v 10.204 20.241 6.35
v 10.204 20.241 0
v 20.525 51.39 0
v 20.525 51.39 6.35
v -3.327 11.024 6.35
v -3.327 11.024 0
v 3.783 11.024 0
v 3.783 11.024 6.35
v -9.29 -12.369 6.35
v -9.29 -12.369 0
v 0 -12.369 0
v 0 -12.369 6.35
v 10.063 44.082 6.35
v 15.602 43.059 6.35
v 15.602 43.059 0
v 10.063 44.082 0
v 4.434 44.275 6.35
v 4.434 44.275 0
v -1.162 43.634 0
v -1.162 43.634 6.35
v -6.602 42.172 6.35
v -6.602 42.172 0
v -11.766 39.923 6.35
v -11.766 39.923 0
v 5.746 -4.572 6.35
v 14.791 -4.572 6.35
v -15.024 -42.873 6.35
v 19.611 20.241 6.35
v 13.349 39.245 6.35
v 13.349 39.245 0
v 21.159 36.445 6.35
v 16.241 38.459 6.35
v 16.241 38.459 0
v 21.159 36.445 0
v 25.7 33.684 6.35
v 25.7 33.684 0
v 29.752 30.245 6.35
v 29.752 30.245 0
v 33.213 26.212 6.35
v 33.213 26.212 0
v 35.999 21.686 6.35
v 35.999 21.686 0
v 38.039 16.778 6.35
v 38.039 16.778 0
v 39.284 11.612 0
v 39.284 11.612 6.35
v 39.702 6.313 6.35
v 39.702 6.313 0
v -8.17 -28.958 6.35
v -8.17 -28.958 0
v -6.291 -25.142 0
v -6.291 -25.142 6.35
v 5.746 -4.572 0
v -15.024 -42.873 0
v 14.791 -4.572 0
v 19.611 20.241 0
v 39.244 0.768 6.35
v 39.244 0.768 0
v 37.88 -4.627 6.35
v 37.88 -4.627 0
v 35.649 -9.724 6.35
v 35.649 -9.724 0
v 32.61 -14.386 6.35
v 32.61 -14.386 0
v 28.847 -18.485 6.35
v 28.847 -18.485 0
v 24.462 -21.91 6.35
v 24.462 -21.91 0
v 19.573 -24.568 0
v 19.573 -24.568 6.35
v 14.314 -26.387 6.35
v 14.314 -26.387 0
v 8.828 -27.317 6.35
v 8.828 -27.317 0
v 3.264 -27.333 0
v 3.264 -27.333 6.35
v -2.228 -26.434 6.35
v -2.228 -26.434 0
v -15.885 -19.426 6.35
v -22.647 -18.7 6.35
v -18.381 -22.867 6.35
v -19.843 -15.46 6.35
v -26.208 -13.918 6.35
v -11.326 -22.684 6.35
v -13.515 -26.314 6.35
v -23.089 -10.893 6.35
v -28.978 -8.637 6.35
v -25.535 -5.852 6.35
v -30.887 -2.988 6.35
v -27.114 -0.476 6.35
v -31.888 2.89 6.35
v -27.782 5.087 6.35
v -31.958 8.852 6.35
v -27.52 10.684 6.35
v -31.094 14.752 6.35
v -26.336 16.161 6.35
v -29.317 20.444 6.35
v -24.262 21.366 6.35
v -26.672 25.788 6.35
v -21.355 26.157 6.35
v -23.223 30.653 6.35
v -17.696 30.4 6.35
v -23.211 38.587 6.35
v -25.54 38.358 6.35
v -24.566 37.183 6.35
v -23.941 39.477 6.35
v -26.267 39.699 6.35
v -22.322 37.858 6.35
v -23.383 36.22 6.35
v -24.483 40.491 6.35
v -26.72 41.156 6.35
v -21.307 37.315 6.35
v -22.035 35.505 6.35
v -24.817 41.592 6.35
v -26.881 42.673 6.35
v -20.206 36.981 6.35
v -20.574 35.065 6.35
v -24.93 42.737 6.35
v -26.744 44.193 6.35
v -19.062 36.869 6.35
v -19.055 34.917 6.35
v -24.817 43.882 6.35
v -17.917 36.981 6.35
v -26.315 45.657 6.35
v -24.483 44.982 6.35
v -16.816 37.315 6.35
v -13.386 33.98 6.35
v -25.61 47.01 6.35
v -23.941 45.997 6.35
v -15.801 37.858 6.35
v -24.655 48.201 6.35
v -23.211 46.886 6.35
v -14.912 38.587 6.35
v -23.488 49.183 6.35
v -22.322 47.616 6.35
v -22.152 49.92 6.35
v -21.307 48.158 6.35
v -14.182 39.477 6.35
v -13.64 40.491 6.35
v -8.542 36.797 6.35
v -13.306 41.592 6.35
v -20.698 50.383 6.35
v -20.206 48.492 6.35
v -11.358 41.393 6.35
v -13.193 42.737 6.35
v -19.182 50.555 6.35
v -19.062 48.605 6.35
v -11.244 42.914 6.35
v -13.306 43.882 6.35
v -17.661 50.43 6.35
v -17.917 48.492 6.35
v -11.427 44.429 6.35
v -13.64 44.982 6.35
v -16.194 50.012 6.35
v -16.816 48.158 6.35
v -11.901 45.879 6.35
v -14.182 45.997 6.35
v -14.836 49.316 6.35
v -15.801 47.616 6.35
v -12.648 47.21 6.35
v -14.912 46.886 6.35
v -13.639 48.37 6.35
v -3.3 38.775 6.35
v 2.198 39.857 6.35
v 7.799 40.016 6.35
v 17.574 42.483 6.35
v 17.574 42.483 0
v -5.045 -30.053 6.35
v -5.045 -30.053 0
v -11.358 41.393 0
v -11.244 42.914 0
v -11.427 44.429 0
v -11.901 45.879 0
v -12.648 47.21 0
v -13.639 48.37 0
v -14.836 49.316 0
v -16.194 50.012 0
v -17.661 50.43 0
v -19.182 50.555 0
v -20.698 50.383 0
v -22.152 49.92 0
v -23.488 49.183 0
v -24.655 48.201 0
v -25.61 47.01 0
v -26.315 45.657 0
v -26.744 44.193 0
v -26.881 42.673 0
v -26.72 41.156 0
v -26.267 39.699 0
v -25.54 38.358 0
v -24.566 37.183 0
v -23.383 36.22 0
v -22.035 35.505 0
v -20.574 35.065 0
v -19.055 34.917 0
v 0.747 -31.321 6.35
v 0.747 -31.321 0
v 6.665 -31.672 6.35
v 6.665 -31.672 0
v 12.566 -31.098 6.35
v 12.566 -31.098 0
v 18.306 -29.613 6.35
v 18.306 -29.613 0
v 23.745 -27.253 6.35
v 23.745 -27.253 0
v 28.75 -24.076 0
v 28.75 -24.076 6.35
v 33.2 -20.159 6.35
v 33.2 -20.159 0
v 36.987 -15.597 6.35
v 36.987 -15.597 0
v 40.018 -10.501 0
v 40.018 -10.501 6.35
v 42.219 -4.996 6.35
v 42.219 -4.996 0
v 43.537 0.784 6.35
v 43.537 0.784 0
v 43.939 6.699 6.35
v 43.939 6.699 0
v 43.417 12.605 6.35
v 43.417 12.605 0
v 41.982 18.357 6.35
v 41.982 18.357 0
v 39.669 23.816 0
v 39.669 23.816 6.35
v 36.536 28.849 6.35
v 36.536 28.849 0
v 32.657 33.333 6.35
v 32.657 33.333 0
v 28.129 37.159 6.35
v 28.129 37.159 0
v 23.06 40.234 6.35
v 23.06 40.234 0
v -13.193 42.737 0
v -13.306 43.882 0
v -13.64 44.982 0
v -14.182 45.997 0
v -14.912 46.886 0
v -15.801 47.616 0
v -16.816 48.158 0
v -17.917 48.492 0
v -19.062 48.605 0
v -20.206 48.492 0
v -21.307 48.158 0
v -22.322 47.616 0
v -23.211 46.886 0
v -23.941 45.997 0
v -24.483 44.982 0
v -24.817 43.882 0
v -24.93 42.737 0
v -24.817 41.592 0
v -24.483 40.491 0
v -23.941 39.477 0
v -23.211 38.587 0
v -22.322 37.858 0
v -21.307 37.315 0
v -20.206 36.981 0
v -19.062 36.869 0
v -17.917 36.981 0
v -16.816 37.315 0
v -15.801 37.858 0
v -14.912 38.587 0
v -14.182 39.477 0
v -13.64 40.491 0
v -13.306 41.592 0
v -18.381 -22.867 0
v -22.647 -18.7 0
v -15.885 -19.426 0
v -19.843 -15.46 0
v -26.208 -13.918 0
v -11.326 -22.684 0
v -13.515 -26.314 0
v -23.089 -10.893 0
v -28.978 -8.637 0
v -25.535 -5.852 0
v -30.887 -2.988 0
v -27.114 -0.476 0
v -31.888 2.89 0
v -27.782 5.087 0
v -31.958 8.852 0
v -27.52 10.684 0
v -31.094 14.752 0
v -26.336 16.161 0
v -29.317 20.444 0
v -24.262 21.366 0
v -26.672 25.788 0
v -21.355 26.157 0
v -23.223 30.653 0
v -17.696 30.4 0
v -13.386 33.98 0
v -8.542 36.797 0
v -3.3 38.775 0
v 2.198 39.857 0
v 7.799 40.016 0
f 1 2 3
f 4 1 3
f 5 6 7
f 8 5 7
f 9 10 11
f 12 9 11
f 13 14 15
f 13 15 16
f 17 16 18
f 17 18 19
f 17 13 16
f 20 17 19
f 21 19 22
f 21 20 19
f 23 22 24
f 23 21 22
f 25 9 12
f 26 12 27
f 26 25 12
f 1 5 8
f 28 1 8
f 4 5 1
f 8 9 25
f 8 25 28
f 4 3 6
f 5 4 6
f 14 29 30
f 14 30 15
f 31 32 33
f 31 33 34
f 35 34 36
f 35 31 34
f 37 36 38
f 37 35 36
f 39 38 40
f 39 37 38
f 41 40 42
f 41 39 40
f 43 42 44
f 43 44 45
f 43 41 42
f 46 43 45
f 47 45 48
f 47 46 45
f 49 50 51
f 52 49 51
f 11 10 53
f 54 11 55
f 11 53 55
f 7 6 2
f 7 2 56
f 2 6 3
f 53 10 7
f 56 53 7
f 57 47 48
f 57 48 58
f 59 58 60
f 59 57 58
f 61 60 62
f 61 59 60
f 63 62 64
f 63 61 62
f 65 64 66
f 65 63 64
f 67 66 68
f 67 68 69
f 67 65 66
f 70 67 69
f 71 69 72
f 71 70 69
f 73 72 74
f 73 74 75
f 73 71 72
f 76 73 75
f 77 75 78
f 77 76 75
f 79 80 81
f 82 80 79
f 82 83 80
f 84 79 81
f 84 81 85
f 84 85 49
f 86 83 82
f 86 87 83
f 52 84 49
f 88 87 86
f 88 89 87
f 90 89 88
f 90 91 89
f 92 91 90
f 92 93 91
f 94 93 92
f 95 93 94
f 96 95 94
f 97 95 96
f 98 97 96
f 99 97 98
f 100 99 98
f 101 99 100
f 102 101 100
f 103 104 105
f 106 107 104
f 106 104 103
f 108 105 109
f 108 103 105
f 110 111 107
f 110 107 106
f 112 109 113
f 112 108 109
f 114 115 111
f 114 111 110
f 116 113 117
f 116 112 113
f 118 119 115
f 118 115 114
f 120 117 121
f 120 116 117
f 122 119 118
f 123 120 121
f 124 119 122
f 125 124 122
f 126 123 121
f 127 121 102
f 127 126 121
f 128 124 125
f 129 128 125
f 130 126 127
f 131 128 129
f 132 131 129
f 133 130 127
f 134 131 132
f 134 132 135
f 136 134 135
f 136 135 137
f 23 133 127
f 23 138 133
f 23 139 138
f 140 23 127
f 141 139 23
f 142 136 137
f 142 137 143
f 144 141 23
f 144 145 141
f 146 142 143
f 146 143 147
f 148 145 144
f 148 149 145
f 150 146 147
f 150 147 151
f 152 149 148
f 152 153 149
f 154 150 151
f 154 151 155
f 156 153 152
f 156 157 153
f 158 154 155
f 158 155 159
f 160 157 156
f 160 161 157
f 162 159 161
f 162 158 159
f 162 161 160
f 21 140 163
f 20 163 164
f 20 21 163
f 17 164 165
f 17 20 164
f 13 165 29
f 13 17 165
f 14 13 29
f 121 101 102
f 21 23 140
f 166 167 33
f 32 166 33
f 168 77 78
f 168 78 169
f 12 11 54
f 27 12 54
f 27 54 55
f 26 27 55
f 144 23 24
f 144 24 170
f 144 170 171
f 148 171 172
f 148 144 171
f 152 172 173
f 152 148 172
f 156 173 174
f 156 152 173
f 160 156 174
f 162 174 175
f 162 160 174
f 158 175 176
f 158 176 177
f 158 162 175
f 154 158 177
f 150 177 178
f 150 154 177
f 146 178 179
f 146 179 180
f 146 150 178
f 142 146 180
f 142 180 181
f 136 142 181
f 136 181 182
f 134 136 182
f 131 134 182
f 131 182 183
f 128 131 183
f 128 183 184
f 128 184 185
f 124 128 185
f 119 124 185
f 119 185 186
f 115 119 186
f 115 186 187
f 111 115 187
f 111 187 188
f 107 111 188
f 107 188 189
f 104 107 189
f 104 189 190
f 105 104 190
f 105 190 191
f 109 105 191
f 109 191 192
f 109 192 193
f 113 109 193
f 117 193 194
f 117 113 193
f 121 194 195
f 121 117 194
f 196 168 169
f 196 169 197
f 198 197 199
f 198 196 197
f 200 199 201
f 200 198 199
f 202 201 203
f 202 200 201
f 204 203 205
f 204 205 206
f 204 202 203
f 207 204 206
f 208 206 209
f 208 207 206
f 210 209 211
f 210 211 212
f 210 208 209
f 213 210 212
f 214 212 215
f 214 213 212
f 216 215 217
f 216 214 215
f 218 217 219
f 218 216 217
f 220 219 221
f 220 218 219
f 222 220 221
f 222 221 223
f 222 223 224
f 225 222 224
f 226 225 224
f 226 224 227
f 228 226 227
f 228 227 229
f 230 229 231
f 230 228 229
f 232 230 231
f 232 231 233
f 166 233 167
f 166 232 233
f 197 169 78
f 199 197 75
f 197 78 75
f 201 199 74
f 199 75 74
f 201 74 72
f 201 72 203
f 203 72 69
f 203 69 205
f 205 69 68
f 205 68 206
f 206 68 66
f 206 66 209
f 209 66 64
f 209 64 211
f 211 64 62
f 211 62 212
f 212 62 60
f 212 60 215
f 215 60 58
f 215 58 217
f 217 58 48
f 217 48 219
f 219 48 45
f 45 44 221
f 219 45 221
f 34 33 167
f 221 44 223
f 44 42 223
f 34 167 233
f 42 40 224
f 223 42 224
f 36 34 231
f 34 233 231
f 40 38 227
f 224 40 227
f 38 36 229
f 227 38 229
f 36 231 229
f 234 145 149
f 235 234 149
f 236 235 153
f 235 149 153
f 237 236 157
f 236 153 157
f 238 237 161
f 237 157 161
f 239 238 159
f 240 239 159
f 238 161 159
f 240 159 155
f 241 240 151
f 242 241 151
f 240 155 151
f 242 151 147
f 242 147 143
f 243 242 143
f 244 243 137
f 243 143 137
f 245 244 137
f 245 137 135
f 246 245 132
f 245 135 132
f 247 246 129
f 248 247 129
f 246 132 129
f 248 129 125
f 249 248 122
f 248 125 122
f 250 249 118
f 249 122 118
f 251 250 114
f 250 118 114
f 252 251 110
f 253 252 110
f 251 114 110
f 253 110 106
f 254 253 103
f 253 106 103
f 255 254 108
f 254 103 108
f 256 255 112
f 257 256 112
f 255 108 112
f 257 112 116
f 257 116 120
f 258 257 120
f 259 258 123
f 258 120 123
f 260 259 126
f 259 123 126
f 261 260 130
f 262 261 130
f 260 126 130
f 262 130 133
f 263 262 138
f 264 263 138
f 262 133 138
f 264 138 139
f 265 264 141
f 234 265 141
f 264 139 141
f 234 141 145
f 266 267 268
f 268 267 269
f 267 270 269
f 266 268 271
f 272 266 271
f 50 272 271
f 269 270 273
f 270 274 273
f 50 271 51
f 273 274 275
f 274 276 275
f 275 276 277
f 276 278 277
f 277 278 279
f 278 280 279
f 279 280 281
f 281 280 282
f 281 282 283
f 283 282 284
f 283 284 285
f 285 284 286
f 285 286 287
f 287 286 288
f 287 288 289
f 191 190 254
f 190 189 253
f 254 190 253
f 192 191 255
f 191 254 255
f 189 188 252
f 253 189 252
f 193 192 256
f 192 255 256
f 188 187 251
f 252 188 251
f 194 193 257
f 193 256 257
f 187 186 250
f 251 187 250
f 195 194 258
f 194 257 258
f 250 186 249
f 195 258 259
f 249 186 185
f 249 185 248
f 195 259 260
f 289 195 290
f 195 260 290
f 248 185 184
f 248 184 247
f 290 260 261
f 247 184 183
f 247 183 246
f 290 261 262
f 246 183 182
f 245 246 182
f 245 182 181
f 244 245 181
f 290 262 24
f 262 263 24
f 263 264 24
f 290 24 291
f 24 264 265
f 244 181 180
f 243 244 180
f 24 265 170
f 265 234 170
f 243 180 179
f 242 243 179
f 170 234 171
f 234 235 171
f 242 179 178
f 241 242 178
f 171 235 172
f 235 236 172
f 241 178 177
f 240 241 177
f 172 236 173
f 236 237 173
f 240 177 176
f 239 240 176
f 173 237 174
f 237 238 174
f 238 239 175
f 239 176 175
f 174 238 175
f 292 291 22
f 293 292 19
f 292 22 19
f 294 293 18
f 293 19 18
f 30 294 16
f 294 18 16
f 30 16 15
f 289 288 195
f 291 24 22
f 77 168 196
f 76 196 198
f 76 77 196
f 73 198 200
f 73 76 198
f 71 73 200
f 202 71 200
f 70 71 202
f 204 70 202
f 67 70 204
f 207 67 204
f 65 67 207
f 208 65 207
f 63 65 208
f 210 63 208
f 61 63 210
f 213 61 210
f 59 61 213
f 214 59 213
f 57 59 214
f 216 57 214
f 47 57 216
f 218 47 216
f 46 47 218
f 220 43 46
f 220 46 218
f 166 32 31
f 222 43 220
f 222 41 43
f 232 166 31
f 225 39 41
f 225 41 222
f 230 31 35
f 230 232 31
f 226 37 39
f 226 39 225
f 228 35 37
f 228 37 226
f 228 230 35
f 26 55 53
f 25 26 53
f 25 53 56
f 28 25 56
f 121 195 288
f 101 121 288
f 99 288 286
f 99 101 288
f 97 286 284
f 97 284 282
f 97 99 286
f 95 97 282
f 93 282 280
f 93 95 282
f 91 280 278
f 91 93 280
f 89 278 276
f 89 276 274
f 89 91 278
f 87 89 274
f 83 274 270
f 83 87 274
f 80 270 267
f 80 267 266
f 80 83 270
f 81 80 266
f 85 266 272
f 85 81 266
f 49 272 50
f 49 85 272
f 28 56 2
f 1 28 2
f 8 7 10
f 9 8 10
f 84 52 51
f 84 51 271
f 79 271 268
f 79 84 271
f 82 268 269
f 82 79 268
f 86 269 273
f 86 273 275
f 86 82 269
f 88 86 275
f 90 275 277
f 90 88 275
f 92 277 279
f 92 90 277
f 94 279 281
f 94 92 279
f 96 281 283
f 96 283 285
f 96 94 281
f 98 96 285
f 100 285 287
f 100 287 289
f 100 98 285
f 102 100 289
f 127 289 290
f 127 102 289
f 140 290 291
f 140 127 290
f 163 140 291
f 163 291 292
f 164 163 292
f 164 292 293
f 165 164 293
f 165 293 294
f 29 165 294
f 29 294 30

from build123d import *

# Parameters (mm, degrees)
F1_DEPTH = 6.35
F3_DEPTH = 6.35
F4_R     = 7.8194869238
F4_R_2   = 5.8680689484
F5_DEPTH = 6.35


with BuildPart() as f1:
    # F0 (on Top) → F1 (new body)
    with BuildSketch(Plane.XY):
        Polygon((10.2044390514, 20.2409497), (20.5251984298, 51.3899475336), (-3.3272264991, 11.0243037343), (3.7826313637, 11.0243037343), (-9.2903310433, -12.3694203794), (0, -12.3694203794), (-15.0240883231, -42.8730025887), (14.7914448753, -4.5715132728), (5.745598625, -4.5715132728), (19.6113856238, 20.2409497), align=None)
    extrude(amount=F1_DEPTH)


with BuildPart() as f3:
    # F2 (on face) → F3 (new body)
    with BuildSketch(Plane.XY.offset(6.35)):
        with BuildLine():
            ThreePointArc((-6.2910568685, -25.142226705), (-26.3355362631, 16.1610780131), (13.3489113778, 39.2454612683))
            Line((13.3489113778, 39.2454612683), (15.6022474373, 43.0587993675))
            ThreePointArc((15.6022474373, 43.0587993675), (-30.1282761074, 18.2224985015), (-8.1703070611, -28.9576903466))
            Line((-8.1703070611, -28.9576903466), (-6.2910568685, -25.142226705))
        make_face()
    extrude(amount=-F3_DEPTH)

    # F4 (on face) → F5 (join)
    with BuildSketch(Plane.XY.offset(6.35)):
        with Locations((-19.0615635365, 42.7367538214)):
            Circle(F4_R)
        with Locations((-19.0615635365, 42.7367538214)):
            Circle(F4_R_2, mode=Mode.SUBTRACT)
    extrude(amount=-F5_DEPTH)


with BuildPart() as f3b:
    # F2 (on face) → F3, piece 2 (new body)
    with BuildSketch(Plane.XY.offset(6.35)):
        with BuildLine():
            ThreePointArc((16.2408188754, 38.4592973202), (33.2131829481, 26.2118953895), (39.7023464178, 6.3133840449))
            ThreePointArc((39.7023464178, 6.3133840449), (26.7251834492, -20.2880192706), (-2.2275902486, -26.4344257227))
            Line((-2.2275902486, -26.4344257227), (-5.0447458233, -30.0533868002))
            ThreePointArc((-5.0447458233, -30.0533868002), (28.5956235275, -24.1914535774), (43.9413588571, 6.3133840449))
            ThreePointArc((43.9413588571, 6.3133840449), (36.6498565452, 28.693610287), (17.57413441, 42.4833658191))
            Line((17.57413441, 42.4833658191), (16.2408188754, 38.4592973202))
        make_face()
    extrude(amount=-F3_DEPTH)


solid = Compound([f1.part, f3.part, f3b.part])
